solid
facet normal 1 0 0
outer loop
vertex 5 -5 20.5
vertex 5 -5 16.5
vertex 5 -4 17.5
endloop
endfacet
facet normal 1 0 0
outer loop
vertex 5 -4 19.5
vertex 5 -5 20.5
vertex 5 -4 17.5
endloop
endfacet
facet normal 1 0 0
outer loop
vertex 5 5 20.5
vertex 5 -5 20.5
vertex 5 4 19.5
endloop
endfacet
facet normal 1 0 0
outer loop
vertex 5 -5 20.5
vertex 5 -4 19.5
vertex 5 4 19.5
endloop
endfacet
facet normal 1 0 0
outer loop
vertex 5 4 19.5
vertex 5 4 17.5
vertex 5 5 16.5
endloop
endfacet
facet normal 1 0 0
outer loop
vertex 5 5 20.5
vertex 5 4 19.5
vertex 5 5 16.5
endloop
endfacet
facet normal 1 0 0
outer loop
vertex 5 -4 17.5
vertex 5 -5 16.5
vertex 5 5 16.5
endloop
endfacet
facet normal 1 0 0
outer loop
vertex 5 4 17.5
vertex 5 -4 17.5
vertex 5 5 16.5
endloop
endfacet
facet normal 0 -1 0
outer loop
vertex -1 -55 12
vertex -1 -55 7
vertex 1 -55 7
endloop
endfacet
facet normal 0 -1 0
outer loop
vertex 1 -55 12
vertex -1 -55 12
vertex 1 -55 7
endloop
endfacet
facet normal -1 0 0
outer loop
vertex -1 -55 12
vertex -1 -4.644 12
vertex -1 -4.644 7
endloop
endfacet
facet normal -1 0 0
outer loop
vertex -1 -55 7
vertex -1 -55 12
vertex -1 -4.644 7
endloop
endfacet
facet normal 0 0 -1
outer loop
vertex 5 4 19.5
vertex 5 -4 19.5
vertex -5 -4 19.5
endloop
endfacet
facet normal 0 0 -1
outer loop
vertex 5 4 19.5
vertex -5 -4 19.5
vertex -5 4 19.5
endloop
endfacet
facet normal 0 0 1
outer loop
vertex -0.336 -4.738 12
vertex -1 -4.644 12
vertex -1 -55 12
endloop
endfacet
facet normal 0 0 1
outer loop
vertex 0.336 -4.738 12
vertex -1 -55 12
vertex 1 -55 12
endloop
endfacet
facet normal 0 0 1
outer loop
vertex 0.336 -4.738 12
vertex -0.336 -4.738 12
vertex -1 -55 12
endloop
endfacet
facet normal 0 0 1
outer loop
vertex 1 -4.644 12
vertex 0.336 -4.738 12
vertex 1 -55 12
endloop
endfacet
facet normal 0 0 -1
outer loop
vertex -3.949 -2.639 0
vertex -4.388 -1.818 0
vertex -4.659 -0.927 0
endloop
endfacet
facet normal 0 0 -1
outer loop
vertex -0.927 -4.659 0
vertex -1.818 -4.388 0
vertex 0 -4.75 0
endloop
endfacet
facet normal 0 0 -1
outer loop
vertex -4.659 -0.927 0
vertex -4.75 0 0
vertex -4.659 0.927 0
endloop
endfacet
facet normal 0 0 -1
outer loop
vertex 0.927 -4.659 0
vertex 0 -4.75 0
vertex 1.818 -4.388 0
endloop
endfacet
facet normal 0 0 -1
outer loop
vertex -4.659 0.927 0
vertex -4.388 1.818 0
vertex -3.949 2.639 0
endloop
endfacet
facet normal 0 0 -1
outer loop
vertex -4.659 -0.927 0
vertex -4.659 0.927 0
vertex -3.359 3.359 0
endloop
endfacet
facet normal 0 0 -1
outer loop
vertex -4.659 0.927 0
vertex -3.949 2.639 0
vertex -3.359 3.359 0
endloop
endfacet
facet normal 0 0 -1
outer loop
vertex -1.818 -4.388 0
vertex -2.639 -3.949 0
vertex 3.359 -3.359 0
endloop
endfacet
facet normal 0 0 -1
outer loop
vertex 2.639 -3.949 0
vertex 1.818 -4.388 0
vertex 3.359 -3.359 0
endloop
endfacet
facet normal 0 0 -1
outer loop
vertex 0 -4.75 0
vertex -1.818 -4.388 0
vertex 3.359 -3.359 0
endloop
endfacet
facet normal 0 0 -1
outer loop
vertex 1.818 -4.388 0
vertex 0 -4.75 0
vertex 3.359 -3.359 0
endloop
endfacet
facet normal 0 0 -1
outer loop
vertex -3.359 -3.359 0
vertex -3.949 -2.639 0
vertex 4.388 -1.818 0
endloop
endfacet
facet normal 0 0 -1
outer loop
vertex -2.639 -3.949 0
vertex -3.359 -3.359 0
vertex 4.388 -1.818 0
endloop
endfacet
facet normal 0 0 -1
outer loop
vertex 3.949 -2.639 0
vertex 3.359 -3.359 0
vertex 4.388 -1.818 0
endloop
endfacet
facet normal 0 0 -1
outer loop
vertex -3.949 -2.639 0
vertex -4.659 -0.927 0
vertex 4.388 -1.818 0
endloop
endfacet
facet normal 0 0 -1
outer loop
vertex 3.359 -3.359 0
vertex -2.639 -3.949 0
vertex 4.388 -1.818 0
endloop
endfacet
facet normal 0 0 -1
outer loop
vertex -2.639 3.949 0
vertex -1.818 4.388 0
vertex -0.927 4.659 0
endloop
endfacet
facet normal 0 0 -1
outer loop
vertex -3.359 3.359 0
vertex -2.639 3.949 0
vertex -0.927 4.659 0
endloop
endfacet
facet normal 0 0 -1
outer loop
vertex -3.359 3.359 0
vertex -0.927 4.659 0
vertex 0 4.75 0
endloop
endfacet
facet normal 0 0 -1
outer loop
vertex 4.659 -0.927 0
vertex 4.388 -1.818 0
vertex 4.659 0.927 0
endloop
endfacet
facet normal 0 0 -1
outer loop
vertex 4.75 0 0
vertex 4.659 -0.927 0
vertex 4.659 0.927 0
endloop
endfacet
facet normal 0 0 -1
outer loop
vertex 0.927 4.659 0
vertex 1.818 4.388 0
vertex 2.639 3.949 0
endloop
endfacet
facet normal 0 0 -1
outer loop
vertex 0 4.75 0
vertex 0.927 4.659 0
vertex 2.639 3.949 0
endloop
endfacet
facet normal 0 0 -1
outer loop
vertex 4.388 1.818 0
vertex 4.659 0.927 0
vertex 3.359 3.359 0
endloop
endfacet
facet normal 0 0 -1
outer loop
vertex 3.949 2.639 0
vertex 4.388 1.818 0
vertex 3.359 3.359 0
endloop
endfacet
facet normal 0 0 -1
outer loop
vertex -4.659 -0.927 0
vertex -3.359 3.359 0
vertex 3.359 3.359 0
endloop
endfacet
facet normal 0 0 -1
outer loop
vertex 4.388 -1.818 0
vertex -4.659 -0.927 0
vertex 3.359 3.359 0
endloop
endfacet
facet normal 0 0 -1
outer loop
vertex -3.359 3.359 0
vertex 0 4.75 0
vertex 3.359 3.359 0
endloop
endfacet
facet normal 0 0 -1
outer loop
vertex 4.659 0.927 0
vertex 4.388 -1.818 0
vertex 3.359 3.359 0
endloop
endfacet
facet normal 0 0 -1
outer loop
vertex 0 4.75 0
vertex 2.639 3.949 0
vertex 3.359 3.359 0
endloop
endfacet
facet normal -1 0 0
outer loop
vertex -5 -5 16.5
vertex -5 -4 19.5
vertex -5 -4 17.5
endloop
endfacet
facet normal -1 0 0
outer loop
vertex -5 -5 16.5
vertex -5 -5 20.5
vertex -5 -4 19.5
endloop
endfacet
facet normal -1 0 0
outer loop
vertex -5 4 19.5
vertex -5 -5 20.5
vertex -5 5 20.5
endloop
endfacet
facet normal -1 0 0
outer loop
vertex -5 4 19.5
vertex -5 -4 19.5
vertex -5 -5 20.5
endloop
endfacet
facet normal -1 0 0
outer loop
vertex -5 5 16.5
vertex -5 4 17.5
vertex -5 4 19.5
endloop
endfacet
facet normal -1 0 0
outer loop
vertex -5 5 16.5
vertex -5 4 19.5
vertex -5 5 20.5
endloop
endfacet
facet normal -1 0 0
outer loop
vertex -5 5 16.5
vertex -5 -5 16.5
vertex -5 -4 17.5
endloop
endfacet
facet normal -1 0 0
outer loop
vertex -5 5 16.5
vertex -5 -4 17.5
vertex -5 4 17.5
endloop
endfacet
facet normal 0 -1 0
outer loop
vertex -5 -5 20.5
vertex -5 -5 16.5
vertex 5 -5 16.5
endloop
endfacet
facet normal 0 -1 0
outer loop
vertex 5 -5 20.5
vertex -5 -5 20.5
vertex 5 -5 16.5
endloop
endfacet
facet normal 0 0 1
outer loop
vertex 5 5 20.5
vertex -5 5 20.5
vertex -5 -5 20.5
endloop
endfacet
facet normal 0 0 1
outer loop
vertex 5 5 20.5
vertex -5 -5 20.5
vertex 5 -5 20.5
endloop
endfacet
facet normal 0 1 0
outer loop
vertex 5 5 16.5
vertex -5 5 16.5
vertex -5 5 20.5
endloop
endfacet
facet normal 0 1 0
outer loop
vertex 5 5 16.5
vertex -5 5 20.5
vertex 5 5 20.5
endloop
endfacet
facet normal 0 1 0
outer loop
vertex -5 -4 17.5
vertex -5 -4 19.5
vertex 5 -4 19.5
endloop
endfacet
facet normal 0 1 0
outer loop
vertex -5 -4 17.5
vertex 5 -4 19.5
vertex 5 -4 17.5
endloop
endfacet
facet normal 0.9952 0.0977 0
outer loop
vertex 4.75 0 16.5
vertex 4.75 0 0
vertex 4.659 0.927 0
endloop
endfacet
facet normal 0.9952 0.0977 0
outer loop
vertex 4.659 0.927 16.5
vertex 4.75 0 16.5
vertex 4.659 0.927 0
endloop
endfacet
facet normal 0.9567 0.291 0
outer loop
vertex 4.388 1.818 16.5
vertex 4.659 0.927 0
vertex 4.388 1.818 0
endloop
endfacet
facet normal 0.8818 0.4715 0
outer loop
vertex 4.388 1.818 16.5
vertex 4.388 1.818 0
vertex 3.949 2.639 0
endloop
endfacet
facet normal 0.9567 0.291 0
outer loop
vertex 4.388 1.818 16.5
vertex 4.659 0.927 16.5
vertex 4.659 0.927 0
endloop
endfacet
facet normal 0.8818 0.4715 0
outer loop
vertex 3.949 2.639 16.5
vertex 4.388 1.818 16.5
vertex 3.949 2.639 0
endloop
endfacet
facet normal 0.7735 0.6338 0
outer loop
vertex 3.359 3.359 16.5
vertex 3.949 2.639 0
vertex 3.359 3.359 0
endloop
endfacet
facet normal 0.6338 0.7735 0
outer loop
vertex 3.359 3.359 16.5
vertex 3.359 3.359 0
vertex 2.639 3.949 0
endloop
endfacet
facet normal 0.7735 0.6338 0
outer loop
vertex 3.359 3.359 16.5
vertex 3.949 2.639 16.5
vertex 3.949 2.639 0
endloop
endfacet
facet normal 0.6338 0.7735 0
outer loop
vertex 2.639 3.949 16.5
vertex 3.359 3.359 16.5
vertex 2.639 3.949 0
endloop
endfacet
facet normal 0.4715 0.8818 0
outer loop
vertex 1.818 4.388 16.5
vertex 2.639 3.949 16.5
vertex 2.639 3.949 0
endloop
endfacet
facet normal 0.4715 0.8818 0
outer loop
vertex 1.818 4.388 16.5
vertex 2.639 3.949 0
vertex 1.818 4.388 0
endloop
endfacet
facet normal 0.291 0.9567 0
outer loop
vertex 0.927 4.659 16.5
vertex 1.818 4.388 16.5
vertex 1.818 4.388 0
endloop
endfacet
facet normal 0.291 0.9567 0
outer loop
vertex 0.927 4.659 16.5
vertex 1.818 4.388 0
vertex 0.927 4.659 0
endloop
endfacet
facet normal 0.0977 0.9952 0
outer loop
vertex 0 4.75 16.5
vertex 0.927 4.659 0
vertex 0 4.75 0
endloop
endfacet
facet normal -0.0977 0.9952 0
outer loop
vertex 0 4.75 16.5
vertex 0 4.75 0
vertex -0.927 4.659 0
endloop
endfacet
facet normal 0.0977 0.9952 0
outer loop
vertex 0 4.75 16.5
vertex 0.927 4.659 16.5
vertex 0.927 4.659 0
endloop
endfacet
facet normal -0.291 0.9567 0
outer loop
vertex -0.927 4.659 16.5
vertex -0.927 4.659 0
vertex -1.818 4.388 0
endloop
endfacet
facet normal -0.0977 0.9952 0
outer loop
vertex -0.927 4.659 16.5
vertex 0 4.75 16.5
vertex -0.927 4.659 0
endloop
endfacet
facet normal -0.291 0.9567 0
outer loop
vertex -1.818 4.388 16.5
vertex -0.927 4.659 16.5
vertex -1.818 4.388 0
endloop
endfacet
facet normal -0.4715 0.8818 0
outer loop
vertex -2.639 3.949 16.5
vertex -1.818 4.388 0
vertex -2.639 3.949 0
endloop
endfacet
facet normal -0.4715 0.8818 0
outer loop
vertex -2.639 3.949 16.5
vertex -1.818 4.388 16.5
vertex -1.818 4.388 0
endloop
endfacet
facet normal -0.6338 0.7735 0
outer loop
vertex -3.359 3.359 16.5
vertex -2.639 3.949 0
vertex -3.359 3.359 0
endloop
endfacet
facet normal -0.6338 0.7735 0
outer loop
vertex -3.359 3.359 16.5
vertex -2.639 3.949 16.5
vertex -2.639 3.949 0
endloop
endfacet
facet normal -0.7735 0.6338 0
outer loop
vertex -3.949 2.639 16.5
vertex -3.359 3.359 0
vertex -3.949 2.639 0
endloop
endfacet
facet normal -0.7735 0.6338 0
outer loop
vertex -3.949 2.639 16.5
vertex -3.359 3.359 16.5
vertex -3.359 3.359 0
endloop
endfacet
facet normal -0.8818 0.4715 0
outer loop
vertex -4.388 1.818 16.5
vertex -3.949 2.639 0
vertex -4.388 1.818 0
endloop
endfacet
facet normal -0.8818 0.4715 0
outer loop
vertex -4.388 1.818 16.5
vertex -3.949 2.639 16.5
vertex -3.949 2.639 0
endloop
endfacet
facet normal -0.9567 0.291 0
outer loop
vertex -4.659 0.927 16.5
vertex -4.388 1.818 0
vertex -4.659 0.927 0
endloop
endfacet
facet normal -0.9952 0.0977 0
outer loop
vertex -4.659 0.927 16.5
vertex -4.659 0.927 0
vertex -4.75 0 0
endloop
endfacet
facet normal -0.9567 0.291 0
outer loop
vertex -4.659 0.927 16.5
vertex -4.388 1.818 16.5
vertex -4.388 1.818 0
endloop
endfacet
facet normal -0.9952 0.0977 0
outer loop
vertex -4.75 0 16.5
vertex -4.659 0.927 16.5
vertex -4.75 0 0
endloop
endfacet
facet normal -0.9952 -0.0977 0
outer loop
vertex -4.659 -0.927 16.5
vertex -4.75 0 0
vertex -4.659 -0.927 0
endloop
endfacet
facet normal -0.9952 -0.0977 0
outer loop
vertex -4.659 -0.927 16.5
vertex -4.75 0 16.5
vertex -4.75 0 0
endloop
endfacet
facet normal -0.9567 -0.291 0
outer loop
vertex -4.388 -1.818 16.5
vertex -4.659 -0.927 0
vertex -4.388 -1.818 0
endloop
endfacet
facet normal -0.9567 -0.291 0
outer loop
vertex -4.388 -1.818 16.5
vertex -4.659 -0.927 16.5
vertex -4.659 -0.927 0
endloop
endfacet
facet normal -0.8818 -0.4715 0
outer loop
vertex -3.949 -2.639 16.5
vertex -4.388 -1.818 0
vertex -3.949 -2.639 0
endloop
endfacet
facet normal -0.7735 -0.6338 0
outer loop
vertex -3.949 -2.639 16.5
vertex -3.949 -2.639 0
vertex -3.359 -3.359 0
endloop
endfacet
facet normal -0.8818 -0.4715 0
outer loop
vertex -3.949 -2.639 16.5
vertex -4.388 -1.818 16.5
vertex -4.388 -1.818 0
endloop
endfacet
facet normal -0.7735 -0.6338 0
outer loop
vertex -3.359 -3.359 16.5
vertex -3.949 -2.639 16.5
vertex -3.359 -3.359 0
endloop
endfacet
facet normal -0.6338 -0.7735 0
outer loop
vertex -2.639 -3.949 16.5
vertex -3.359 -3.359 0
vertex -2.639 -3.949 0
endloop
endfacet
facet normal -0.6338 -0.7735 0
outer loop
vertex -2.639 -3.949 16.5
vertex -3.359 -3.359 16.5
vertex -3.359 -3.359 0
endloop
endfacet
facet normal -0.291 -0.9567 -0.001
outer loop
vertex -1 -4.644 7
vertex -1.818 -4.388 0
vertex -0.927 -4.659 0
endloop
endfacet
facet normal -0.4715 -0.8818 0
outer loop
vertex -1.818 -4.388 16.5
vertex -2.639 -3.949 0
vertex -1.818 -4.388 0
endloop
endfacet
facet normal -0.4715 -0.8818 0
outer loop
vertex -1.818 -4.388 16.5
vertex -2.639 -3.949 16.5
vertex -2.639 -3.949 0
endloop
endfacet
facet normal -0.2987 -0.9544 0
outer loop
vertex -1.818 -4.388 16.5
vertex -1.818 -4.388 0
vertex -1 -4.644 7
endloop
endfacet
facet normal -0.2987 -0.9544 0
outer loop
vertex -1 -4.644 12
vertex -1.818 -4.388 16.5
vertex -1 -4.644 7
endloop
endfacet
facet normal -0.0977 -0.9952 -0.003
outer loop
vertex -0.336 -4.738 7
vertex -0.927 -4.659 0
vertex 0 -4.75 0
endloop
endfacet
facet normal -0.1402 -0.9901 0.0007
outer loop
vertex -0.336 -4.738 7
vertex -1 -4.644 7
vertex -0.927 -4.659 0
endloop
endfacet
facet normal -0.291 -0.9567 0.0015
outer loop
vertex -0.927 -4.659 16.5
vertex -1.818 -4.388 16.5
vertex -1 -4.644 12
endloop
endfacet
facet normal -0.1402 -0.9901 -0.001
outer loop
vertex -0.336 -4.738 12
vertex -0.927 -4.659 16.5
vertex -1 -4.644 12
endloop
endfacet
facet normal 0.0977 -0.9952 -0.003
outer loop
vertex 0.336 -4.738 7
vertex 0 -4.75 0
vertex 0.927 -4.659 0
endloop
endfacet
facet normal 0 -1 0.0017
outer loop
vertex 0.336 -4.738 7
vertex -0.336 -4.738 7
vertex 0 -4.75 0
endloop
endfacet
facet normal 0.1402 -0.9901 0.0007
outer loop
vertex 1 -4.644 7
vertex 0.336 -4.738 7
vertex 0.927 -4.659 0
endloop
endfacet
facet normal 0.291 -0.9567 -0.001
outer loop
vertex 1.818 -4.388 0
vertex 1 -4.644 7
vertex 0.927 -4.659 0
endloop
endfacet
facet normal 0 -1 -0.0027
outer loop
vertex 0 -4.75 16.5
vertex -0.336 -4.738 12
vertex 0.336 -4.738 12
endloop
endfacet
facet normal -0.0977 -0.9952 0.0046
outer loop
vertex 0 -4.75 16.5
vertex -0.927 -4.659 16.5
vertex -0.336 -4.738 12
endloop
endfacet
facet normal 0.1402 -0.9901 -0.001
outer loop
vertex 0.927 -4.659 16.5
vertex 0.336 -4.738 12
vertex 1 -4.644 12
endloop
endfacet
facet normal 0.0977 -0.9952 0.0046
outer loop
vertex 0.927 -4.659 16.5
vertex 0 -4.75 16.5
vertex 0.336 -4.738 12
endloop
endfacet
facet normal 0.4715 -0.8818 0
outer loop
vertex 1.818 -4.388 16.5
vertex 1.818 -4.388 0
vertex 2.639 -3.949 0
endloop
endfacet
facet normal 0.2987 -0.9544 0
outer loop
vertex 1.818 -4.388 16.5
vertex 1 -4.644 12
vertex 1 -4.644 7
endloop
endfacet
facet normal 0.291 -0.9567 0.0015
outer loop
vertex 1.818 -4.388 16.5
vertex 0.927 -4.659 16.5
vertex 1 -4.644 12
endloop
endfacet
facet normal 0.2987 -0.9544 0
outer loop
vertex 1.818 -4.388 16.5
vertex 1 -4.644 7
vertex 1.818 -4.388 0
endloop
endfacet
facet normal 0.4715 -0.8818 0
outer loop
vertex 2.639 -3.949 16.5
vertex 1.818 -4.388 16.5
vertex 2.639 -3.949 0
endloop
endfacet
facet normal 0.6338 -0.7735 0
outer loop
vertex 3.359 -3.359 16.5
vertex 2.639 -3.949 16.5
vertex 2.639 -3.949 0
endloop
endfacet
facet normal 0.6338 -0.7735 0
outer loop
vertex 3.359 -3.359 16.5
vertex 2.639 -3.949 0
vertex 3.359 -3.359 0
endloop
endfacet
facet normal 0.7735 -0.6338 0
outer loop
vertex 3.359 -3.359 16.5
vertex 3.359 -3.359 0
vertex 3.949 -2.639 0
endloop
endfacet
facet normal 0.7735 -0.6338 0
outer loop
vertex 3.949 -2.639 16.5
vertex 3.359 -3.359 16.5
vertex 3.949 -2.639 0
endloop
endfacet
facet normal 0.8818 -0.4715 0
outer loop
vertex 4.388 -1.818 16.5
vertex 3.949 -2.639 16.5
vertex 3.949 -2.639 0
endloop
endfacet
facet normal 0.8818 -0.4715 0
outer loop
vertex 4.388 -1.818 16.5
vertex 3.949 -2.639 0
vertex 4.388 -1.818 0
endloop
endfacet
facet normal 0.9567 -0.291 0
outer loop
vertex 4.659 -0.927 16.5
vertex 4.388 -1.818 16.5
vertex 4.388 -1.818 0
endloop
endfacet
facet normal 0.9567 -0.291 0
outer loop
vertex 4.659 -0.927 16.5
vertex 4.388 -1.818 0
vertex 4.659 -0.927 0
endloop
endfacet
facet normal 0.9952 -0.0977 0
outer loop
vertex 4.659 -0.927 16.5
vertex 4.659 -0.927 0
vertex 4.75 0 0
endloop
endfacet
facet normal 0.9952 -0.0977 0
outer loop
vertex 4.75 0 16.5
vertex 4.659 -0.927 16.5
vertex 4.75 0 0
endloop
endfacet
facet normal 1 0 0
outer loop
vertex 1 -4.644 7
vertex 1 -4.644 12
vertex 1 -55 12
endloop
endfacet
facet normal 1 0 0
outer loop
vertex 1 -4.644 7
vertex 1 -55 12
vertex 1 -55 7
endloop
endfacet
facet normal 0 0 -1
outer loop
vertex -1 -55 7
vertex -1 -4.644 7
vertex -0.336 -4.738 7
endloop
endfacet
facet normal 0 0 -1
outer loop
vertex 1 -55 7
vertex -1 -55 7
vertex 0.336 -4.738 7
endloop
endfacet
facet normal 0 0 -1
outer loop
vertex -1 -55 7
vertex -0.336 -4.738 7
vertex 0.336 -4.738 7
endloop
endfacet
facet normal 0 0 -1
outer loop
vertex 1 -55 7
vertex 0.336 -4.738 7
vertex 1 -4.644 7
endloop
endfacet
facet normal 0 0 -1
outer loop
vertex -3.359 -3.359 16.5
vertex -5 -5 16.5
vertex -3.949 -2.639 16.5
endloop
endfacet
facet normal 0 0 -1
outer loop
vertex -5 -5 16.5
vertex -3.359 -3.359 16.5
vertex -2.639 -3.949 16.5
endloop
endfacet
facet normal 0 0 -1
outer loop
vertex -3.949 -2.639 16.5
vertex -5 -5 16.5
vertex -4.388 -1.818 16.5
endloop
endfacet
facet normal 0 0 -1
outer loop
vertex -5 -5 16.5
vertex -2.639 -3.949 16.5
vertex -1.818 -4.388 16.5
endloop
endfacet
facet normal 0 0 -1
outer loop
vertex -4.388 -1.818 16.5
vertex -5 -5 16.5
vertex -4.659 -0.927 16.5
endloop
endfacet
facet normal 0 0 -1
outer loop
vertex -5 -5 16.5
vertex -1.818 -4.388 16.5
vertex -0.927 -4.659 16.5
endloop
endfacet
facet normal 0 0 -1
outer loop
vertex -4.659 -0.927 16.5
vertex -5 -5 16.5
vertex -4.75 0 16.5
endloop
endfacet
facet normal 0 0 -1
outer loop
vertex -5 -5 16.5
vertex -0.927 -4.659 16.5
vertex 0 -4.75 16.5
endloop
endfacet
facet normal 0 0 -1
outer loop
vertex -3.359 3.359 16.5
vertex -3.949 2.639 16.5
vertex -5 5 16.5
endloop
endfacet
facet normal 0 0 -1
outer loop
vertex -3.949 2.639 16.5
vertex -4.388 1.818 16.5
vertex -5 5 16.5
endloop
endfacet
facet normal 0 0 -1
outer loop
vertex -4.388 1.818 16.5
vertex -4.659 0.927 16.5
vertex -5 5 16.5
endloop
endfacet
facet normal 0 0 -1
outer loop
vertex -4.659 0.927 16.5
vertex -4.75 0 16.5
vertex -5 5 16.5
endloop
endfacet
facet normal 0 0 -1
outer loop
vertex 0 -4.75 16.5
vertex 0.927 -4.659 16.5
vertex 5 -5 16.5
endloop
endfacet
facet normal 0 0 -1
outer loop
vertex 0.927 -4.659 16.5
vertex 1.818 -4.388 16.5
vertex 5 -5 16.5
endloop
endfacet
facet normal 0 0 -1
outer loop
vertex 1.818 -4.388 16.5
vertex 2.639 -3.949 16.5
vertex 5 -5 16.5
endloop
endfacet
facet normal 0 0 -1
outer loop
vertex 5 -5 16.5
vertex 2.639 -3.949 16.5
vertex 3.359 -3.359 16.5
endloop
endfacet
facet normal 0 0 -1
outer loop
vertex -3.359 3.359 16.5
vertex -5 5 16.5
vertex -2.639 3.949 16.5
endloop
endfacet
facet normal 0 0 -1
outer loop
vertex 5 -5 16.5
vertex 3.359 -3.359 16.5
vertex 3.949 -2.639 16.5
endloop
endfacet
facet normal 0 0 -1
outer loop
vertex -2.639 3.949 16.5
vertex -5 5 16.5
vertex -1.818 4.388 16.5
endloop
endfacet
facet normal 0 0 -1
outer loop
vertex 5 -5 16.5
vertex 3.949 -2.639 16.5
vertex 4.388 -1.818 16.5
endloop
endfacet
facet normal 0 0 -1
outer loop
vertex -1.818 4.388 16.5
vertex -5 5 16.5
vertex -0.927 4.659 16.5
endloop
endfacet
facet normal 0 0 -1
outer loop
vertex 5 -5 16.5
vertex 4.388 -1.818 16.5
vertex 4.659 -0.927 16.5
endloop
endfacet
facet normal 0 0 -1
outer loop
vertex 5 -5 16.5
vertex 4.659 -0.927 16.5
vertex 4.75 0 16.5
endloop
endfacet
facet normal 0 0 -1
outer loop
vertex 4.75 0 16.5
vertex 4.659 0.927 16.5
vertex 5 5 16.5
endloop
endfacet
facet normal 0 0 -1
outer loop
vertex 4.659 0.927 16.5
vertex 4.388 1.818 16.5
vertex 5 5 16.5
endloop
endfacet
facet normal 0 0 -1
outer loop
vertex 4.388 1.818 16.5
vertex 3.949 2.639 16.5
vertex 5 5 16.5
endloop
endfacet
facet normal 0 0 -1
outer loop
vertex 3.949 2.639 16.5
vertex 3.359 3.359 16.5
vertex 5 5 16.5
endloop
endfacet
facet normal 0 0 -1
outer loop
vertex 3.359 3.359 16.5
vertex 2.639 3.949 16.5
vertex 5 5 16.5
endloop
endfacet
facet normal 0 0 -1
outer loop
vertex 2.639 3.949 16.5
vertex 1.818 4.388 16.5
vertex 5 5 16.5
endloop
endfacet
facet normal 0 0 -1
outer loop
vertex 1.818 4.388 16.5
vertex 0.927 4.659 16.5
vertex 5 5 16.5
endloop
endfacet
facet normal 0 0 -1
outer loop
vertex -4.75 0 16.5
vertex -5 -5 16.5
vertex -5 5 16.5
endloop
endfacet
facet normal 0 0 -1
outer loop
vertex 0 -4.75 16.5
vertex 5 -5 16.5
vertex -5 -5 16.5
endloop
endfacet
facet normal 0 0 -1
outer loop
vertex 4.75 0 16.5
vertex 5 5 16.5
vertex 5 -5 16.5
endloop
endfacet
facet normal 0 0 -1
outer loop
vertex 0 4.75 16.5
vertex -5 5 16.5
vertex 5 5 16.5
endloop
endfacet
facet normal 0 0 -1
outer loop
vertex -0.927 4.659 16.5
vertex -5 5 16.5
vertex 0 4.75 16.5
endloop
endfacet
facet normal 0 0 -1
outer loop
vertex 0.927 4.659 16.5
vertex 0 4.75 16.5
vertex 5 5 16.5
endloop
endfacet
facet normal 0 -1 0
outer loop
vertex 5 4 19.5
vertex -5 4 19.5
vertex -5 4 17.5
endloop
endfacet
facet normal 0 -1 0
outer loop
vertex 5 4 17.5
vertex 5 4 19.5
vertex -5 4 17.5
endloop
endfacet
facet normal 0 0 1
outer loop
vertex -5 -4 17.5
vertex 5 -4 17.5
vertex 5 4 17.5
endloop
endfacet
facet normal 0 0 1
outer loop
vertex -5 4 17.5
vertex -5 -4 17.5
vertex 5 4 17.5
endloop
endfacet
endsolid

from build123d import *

# Parameters (mm, degrees)
SKETCH2_R               = 4.75
SKETCH3_R               = 4.75
SKETCH4_W               = 2
SKETCH4_H               = 5
BOSS_EXTRUDE1_DEPTH     = 55
SKETCH3_7_W             = 10
SKETCH3_7_H             = 10
BOSS_EXTRUDE4_DEPTH     = 4
SKETCH8_W               = 2
SKETCH8_H               = 8
CUT_EXTRUDE2_DEPTH      = 1
CUT_EXTRUDE2_DEPTH_BACK = 11


with BuildPart() as part:
    # Sketch2 → Loft1 section 0
    with BuildSketch(Plane.XY):
        Circle(SKETCH2_R)
    # Sketch3 → Loft1 section 1
    with BuildSketch(Plane.XY.offset(16.5)):
        Circle(SKETCH3_R)
    loft()

    # Sketch4 → Boss-Extrude1 (add)
    with BuildSketch(Plane(origin=(0, 0, 0), x_dir=(1, 0, 0), z_dir=(0, 1, 0))):
        with Locations((0, -9.5)):
            Rectangle(SKETCH4_W, SKETCH4_H)
    extrude(amount=-BOSS_EXTRUDE1_DEPTH)

    # Sketch3<7> → Boss-Extrude4 (add)
    with BuildSketch(Plane.XY.offset(16.5)):
        Rectangle(SKETCH3_7_W, SKETCH3_7_H)
    extrude(amount=BOSS_EXTRUDE4_DEPTH)

    # Sketch8 → Cut-Extrude2 (cut, two sides)
    with BuildSketch(Plane(origin=(5, 0, 0), x_dir=(0, 0, -1), z_dir=(1, 0, 0))) as cut_extrude2_sk:
        with Locations((-18.5, 0)):
            Rectangle(SKETCH8_W, SKETCH8_H)
    extrude(amount=CUT_EXTRUDE2_DEPTH, mode=Mode.SUBTRACT)
    extrude(cut_extrude2_sk.sketch, amount=-CUT_EXTRUDE2_DEPTH_BACK, mode=Mode.SUBTRACT)


solid = part.part
